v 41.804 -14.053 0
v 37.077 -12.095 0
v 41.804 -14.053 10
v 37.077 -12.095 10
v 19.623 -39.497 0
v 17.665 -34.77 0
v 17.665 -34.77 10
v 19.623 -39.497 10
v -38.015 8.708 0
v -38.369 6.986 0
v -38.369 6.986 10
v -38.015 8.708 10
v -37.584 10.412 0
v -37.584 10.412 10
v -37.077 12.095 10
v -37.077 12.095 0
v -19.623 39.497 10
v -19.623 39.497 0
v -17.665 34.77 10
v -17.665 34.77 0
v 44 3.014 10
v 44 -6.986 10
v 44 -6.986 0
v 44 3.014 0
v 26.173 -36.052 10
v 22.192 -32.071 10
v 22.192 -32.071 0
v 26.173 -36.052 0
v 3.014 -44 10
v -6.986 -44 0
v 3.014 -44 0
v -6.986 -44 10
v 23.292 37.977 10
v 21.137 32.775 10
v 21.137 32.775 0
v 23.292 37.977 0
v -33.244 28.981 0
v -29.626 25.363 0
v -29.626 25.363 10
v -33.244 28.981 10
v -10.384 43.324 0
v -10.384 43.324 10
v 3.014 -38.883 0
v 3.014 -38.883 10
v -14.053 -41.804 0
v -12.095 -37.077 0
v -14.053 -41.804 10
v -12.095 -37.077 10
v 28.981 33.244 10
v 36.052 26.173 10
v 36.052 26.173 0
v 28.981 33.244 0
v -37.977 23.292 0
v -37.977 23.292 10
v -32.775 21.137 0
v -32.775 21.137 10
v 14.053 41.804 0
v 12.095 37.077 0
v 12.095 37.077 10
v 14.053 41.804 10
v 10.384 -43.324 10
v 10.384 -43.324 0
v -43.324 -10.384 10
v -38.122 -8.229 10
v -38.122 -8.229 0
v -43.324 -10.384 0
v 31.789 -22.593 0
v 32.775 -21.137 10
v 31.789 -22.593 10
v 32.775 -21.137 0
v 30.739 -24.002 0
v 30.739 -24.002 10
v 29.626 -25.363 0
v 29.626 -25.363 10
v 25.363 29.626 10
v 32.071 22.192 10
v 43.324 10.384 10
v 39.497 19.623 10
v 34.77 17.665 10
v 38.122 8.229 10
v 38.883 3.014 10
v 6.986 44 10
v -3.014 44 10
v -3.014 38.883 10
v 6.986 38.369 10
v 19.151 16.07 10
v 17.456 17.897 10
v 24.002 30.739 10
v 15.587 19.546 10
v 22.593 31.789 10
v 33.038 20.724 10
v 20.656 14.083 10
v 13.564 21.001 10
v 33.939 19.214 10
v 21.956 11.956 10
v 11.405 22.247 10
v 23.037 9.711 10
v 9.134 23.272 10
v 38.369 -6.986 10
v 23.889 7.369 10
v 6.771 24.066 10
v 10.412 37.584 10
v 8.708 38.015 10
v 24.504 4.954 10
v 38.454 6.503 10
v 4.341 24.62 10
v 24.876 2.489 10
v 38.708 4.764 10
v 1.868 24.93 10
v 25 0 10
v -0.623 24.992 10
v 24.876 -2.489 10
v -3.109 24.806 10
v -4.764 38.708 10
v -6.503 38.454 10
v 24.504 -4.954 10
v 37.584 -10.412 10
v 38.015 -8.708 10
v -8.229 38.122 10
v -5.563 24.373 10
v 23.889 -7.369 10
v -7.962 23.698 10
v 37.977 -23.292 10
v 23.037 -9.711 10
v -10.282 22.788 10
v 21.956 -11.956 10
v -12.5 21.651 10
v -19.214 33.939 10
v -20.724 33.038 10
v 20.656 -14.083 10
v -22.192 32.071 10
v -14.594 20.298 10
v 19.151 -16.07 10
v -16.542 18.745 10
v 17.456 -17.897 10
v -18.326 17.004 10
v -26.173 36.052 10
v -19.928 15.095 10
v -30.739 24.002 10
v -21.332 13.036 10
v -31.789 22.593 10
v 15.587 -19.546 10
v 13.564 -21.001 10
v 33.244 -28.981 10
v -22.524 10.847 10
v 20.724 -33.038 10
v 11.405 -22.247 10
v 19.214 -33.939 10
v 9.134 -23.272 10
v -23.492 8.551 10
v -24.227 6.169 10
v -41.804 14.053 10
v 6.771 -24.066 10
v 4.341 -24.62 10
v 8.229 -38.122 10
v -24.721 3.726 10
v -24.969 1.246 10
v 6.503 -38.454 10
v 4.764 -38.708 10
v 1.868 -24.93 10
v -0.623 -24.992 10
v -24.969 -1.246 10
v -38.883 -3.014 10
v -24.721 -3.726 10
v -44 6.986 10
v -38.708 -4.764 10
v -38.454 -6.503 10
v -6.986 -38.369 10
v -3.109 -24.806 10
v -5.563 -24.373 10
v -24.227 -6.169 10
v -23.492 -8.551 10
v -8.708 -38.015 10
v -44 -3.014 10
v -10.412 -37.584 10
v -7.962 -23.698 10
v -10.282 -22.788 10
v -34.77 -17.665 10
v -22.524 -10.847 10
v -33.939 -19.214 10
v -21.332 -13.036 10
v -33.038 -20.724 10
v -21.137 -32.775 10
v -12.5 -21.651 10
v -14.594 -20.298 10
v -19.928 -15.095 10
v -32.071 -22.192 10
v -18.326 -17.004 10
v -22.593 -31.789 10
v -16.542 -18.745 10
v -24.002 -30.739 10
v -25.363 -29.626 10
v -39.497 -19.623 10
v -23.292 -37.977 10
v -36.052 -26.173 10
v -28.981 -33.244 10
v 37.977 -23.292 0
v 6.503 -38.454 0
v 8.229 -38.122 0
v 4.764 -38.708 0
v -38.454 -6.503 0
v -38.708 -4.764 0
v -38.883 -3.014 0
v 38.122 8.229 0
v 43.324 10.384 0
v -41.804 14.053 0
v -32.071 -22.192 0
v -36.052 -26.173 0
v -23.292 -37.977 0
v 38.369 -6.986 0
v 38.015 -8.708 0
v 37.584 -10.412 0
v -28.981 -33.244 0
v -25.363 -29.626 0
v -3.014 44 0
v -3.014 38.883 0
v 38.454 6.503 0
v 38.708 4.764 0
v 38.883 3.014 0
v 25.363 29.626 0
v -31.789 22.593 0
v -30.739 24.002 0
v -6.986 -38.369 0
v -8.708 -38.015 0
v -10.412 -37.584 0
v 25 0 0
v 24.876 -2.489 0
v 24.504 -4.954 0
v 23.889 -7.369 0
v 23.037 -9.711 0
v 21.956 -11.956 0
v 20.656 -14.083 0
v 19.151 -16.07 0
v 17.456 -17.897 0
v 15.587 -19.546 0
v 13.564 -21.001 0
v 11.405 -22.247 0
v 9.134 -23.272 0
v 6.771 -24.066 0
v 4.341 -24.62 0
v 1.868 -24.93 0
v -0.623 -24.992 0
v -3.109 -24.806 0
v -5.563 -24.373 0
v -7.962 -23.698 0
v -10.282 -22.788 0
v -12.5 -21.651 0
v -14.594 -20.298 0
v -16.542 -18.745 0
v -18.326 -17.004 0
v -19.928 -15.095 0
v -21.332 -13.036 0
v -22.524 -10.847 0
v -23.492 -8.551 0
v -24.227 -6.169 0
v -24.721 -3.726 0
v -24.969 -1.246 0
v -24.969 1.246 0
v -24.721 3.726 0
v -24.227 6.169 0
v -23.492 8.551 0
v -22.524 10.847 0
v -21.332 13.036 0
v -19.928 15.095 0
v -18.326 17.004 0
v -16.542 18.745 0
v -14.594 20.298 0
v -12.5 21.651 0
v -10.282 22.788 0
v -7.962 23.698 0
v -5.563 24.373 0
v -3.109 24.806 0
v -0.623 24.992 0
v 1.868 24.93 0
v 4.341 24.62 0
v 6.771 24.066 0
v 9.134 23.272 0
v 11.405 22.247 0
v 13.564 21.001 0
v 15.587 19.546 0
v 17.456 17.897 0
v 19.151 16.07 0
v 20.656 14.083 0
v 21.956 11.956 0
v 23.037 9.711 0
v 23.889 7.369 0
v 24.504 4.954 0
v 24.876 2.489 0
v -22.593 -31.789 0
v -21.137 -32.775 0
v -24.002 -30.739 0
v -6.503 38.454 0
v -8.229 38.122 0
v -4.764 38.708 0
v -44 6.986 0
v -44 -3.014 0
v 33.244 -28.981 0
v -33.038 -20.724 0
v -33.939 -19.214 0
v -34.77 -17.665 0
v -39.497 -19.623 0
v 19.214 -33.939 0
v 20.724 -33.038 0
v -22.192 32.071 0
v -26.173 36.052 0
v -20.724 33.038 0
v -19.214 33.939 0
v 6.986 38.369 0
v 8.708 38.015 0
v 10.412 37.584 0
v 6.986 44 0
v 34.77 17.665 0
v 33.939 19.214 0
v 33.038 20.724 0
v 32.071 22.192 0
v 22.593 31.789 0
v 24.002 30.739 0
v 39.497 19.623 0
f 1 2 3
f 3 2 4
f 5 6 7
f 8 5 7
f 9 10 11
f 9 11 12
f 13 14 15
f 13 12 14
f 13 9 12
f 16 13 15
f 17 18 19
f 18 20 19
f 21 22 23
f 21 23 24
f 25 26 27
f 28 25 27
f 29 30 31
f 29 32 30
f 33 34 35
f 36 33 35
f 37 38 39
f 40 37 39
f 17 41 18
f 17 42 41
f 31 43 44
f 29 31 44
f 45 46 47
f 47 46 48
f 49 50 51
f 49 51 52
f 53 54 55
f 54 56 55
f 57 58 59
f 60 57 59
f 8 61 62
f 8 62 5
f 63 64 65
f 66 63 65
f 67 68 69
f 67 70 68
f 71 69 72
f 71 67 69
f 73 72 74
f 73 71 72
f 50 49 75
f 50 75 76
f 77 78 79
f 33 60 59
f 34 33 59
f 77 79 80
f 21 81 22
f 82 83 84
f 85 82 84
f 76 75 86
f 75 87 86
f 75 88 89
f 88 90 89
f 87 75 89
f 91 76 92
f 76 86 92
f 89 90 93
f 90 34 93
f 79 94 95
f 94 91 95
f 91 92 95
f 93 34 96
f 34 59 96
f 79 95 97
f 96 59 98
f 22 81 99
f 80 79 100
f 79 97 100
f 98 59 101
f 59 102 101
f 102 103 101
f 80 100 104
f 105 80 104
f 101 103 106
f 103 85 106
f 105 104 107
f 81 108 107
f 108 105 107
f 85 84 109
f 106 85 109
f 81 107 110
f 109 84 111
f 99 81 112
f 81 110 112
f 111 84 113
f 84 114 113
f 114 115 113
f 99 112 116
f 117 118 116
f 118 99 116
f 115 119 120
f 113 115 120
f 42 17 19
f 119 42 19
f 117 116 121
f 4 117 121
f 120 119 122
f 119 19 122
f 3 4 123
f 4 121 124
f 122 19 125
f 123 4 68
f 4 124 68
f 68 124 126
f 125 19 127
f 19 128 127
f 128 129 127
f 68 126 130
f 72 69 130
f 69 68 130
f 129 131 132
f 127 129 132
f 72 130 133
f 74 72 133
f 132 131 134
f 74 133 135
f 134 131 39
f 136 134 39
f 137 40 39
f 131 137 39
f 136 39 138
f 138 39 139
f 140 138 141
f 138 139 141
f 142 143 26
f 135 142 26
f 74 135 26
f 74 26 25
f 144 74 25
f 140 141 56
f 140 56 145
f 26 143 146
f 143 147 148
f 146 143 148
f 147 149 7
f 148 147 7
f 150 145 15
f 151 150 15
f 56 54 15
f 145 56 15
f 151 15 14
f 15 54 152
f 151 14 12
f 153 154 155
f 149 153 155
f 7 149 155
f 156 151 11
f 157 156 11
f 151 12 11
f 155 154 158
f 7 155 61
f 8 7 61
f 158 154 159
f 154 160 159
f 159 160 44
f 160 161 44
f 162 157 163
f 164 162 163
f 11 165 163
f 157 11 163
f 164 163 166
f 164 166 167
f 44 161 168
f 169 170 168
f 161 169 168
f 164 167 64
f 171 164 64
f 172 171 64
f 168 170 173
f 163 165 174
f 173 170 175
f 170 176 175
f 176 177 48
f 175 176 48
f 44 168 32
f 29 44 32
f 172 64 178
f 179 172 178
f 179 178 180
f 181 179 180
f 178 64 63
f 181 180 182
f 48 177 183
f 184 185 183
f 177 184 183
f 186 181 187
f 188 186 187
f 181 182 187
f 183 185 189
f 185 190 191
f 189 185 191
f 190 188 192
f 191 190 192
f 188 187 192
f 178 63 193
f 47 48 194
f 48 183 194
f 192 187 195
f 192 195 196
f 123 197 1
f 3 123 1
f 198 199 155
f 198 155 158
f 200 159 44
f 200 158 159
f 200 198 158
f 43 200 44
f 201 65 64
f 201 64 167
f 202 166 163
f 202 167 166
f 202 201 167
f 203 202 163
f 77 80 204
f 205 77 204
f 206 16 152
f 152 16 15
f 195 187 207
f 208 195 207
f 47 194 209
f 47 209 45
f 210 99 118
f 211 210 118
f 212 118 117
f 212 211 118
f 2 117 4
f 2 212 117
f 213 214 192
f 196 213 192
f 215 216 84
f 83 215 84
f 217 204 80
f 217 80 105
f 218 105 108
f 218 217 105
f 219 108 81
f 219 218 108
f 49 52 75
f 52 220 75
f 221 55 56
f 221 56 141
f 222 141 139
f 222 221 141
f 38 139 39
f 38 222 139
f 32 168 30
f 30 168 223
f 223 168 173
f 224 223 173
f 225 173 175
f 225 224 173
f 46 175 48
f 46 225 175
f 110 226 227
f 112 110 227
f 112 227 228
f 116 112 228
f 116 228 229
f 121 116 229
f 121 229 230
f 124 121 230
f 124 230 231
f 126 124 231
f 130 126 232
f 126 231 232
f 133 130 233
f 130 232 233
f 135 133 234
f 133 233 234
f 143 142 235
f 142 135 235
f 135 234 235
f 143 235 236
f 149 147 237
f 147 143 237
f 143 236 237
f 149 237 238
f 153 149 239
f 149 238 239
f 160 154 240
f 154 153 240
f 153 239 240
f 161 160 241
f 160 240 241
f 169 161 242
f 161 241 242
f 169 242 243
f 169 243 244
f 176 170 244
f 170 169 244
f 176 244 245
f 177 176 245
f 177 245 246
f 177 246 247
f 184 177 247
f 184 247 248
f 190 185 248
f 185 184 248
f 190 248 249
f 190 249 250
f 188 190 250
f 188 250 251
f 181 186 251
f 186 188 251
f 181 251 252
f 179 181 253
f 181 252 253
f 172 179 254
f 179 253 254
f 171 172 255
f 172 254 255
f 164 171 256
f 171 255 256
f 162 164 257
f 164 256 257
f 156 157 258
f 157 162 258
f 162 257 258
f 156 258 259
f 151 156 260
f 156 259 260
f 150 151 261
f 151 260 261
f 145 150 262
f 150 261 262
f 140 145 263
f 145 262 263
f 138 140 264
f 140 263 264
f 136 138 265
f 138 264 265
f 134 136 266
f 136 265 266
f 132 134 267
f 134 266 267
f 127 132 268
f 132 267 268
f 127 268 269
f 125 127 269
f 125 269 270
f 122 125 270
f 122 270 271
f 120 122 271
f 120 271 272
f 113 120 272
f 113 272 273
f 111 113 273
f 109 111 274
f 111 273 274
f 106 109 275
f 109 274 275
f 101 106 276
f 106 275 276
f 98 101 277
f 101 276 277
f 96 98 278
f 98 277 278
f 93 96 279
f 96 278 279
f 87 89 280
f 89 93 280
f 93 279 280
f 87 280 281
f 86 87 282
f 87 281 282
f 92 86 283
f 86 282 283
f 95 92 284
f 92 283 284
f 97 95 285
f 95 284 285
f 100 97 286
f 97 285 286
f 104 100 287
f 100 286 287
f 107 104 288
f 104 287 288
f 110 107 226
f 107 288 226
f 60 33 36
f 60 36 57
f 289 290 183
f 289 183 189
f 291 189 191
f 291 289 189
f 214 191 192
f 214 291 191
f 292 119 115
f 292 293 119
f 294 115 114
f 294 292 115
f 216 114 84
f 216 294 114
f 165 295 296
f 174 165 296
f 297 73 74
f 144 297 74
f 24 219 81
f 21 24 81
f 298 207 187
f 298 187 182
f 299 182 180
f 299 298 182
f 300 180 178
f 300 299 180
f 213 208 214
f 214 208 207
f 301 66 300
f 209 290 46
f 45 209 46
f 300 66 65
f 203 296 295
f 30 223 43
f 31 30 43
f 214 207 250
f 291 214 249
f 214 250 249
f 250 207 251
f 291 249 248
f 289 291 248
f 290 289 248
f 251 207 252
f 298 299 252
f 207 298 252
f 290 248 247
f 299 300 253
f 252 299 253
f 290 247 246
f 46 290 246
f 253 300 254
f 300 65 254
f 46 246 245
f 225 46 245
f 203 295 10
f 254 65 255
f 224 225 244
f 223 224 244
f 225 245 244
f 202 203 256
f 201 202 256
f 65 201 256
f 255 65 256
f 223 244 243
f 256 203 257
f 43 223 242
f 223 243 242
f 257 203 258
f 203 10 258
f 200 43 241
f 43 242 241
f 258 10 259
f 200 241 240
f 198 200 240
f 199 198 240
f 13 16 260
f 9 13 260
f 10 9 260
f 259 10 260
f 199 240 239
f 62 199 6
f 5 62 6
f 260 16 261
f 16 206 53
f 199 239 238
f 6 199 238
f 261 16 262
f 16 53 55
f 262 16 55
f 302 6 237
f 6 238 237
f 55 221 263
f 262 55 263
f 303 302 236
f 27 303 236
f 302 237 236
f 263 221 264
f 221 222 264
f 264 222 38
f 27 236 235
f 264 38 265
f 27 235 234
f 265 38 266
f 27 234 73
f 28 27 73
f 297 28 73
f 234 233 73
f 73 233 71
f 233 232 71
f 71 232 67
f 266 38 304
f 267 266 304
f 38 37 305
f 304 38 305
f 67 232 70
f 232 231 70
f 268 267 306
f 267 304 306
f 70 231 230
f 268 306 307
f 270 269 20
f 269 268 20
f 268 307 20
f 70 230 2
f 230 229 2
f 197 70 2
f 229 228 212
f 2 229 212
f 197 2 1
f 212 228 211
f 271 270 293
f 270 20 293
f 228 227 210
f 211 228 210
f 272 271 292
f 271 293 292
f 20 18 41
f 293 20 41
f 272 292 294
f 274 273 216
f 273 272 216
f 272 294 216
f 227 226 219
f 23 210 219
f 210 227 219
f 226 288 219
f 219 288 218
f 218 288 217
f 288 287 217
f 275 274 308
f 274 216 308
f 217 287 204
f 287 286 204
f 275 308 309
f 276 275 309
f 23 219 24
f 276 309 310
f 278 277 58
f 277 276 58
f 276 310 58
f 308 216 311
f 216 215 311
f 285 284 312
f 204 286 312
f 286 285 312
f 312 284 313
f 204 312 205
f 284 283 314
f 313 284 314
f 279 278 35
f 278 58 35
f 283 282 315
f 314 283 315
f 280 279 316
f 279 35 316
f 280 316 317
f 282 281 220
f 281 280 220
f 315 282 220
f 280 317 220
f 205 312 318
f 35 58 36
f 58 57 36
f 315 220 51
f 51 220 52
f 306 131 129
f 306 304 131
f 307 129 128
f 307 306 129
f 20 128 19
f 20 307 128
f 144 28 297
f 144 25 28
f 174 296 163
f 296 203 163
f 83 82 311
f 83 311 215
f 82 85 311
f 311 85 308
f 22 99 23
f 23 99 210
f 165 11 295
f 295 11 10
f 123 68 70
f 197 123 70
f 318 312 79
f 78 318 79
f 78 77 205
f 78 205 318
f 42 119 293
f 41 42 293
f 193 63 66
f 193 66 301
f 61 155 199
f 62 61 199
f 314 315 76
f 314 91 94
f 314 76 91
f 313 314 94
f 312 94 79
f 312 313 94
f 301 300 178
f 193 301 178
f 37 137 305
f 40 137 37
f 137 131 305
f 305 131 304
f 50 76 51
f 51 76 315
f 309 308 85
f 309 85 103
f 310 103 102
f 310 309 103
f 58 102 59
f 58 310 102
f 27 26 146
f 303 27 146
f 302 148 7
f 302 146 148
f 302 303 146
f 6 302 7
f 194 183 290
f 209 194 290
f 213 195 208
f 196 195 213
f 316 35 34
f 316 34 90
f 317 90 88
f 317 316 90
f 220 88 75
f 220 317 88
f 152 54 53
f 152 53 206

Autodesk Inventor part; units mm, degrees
ref_plane "XZ Plane" through (0, 0, 0) normal (0, 1, 0) x (-1, 0, 0)
ref_plane "XY Plane" through (0, 0, 0) normal (0, 0, 1) x (1, 0, 0)
sketch "Sketch1" plane through (0, 0, 0) normal (0, 0, 1) x (1, 0, 0)
  line L0 (-522.2408, 82.6105) -> (-274.5908, 82.6105) construction
  line L1 (-274.5908, 82.6105) -> (-274.5908, -141.3329) construction
  line L2 (-274.5908, -141.3329) -> (-522.2408, -141.3329) construction
  line L3 (-522.2408, -141.3329) -> (-522.2408, 82.6105) construction
  circle A0 centre (0, 0) radius 25
  circle A1 centre (0, 0) radius 39
  dimension "d7" = 50
  dimension "d8" = 78
extrude "Extrusion1" add sketch "Sketch1" along normal blind 10
ref_plane "Work Plane1" through (39, 0, 0) normal (1, 0, 0) x (0, 1, 0)
sketch "Sketch2" plane through (39, 0, 0) normal (1, 0, 0) x (0, 1, 0)
  line L0 (39, 10) -> (-39, 10) projected
  line L1 (3.0144, 10) -> (-6.9856, 10)
  line L2 (-6.9856, 10) -> (-6.9856, 0)
  line L3 (-6.9856, 0) -> (3.0144, 0)
  line L4 (3.0144, 0) -> (3.0144, 10)
  point P0 (0, 0)
  dimension "d13" = 10
  dimension "d14" = 10
extrude "Extrusion2" add sketch "Sketch2" along normal blind 5 and the other way blind 5
pattern_circular "Circular Pattern1" count 16 over 360 about axis through (0, 0, 0) along (0, 0, 1) of "Extrusion2"
properties part number "cad@36"
